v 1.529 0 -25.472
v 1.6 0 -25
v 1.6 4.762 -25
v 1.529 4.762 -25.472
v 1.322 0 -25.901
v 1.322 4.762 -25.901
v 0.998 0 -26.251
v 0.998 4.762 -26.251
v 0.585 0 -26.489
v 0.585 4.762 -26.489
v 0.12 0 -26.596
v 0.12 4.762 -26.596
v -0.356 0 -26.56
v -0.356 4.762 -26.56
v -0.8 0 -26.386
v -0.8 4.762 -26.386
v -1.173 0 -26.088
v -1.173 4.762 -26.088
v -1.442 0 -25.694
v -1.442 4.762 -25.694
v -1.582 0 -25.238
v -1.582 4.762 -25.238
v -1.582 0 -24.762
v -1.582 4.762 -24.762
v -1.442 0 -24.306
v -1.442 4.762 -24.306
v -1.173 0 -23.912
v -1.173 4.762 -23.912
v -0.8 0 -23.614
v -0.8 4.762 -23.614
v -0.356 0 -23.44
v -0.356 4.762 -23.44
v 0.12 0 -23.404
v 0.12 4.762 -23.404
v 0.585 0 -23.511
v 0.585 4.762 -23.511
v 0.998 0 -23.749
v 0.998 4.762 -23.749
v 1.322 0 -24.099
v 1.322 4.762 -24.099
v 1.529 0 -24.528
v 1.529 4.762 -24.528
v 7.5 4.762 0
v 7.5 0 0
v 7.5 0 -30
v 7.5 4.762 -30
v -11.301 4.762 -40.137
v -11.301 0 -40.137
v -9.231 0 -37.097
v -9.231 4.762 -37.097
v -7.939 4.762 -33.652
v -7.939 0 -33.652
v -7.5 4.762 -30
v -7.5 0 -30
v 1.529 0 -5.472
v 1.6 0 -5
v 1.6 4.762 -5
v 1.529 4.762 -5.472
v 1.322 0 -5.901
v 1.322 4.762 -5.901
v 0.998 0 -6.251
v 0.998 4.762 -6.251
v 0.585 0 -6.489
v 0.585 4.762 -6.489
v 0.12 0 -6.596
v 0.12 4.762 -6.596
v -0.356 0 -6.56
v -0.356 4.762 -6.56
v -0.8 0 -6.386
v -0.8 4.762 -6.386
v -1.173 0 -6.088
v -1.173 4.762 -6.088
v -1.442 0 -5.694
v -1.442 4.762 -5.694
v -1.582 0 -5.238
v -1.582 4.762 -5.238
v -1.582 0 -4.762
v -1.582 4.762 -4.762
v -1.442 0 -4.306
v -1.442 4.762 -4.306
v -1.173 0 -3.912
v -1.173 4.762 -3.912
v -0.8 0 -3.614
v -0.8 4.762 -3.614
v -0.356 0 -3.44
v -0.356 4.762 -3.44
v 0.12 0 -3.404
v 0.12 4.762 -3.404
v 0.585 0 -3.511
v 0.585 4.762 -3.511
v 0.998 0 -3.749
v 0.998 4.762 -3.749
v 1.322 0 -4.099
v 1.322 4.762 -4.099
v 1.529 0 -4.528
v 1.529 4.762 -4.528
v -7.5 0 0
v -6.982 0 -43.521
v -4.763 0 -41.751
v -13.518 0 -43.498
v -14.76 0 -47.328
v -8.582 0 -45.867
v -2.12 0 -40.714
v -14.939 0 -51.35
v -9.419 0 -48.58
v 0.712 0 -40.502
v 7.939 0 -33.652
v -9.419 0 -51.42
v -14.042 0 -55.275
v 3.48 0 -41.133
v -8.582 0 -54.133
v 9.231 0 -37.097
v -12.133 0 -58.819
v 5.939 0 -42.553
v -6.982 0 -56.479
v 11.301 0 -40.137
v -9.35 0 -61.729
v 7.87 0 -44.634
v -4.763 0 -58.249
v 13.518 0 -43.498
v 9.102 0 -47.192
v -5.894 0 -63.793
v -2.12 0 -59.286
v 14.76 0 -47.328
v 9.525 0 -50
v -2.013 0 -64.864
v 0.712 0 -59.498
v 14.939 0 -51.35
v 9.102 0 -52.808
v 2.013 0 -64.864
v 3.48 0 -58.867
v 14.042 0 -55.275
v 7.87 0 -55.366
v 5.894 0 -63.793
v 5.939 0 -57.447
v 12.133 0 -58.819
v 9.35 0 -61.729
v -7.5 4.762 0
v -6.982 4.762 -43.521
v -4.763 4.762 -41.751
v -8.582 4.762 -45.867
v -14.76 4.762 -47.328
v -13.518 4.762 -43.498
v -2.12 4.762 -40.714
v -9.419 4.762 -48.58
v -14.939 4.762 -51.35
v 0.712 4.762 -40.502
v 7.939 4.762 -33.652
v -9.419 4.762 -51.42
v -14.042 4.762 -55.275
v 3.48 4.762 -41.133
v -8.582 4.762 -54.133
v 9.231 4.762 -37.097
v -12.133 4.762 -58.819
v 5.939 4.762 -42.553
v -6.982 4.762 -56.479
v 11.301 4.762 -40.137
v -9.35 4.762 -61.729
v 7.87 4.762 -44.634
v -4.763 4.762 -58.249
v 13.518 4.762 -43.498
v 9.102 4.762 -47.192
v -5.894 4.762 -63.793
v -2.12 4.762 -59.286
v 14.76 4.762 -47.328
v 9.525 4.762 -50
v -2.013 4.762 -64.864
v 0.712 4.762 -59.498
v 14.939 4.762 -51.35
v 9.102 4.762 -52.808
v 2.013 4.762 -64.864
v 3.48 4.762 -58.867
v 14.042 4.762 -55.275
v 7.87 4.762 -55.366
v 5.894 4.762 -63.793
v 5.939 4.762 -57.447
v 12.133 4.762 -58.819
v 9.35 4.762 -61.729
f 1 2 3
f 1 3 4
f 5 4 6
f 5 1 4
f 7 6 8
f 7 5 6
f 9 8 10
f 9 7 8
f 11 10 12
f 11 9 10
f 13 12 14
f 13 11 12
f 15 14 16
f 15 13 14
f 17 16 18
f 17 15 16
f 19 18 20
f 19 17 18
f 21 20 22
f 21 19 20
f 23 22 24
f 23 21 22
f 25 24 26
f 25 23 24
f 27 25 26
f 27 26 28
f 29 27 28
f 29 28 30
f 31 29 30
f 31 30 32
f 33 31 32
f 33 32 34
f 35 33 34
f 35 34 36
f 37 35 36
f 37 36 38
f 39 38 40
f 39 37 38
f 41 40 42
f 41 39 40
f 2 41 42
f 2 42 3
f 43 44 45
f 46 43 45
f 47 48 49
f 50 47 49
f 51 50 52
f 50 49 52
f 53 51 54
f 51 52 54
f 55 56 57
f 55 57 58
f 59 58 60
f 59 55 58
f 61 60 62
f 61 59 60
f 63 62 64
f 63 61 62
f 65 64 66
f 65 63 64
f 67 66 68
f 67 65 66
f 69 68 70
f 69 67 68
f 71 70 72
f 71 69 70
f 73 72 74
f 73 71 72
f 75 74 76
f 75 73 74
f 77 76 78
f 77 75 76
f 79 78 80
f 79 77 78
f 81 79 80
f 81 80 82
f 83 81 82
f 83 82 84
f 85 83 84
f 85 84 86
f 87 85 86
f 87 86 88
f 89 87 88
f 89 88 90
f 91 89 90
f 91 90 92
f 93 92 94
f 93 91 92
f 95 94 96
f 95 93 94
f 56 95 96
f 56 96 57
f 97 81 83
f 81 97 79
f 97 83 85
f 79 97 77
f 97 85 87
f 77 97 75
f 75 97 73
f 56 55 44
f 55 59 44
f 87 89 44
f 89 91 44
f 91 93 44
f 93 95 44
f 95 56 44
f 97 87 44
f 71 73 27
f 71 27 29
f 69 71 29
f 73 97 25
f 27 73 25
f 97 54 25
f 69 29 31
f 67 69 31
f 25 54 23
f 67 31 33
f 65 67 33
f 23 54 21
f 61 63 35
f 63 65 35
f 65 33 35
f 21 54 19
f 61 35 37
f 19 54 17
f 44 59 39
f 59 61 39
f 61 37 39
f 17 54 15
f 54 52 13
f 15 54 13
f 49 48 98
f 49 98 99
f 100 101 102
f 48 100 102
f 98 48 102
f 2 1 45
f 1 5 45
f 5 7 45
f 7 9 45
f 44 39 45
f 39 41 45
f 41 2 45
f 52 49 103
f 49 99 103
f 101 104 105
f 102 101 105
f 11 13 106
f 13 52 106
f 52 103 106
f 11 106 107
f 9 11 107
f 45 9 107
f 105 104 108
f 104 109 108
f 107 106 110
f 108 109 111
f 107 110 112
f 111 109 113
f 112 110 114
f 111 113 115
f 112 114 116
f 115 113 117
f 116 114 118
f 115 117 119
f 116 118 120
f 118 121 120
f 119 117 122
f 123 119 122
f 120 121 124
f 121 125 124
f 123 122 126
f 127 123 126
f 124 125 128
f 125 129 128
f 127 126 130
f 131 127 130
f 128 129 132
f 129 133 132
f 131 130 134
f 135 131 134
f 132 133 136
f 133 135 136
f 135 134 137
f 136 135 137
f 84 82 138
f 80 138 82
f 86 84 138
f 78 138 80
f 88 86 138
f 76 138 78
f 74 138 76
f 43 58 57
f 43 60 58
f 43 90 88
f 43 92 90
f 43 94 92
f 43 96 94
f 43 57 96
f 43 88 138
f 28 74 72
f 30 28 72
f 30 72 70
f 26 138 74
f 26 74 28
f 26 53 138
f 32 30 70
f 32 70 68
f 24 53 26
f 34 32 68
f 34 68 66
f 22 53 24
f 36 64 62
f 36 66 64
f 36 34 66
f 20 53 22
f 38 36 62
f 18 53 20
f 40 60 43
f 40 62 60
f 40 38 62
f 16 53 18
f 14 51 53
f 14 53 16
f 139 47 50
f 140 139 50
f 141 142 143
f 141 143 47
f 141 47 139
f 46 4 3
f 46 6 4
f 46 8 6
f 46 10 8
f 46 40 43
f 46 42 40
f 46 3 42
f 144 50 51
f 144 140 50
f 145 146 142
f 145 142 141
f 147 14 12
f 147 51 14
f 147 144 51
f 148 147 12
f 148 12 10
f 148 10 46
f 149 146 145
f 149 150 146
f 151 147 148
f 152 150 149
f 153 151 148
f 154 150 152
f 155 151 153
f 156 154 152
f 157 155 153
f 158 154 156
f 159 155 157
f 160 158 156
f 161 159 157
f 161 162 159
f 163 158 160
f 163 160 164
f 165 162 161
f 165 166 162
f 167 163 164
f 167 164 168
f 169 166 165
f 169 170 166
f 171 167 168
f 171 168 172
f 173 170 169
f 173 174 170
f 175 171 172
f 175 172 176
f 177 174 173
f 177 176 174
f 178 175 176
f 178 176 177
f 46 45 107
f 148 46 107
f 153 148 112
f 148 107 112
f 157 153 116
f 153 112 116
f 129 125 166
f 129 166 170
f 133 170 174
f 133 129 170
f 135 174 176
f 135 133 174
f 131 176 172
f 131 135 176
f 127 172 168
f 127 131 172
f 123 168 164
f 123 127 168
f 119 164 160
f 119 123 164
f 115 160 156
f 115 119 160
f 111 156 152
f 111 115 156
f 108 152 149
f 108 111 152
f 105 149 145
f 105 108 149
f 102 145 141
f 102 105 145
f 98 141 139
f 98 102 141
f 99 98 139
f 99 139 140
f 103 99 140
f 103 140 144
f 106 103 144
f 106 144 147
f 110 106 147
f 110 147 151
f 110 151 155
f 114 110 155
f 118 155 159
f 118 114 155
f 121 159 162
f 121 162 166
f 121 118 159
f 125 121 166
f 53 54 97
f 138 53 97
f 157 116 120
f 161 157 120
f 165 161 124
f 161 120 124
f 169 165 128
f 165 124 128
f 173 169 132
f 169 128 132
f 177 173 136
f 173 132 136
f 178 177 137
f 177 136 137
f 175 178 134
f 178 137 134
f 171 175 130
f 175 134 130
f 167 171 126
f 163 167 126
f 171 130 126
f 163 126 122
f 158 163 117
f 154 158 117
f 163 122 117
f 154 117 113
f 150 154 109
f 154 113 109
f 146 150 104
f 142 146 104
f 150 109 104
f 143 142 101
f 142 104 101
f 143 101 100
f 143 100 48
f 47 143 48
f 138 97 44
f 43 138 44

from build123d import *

# Parameters (mm, degrees)
SKETCH1_R           = 9.525
SKETCH1_R_2         = 1.6
BOSS_EXTRUDE2_DEPTH = 4.7625


with BuildPart() as part:
    # Sketch1 → Boss-Extrude2 (new body)
    with BuildSketch(Plane(origin=(0, 0, 0), x_dir=(1, 0, 0), z_dir=(0, 1, 0))):
        with BuildLine():
            Line((-7.5, 0), (7.5, 0))
            Line((7.5, 0), (7.5, 30))
            ThreePointArc((7.5, 30), (8.481591846, 35.413153058), (11.301369863, 40.136986301))
            ThreePointArc((11.301369863, 40.136986301), (0, 65), (-11.301369863, 40.136986301))
            ThreePointArc((-11.301369863, 40.136986301), (-8.481591846, 35.413153058), (-7.5, 30))
            Line((-7.5, 30), (-7.5, 0))
        make_face()
        with Locations((0, 50)):
            Circle(SKETCH1_R, mode=Mode.SUBTRACT)
        with Locations((0, 5)):
            Circle(SKETCH1_R_2, mode=Mode.SUBTRACT)
        with Locations((0, 25)):
            Circle(SKETCH1_R_2, mode=Mode.SUBTRACT)
    extrude(amount=BOSS_EXTRUDE2_DEPTH)


solid = part.part
